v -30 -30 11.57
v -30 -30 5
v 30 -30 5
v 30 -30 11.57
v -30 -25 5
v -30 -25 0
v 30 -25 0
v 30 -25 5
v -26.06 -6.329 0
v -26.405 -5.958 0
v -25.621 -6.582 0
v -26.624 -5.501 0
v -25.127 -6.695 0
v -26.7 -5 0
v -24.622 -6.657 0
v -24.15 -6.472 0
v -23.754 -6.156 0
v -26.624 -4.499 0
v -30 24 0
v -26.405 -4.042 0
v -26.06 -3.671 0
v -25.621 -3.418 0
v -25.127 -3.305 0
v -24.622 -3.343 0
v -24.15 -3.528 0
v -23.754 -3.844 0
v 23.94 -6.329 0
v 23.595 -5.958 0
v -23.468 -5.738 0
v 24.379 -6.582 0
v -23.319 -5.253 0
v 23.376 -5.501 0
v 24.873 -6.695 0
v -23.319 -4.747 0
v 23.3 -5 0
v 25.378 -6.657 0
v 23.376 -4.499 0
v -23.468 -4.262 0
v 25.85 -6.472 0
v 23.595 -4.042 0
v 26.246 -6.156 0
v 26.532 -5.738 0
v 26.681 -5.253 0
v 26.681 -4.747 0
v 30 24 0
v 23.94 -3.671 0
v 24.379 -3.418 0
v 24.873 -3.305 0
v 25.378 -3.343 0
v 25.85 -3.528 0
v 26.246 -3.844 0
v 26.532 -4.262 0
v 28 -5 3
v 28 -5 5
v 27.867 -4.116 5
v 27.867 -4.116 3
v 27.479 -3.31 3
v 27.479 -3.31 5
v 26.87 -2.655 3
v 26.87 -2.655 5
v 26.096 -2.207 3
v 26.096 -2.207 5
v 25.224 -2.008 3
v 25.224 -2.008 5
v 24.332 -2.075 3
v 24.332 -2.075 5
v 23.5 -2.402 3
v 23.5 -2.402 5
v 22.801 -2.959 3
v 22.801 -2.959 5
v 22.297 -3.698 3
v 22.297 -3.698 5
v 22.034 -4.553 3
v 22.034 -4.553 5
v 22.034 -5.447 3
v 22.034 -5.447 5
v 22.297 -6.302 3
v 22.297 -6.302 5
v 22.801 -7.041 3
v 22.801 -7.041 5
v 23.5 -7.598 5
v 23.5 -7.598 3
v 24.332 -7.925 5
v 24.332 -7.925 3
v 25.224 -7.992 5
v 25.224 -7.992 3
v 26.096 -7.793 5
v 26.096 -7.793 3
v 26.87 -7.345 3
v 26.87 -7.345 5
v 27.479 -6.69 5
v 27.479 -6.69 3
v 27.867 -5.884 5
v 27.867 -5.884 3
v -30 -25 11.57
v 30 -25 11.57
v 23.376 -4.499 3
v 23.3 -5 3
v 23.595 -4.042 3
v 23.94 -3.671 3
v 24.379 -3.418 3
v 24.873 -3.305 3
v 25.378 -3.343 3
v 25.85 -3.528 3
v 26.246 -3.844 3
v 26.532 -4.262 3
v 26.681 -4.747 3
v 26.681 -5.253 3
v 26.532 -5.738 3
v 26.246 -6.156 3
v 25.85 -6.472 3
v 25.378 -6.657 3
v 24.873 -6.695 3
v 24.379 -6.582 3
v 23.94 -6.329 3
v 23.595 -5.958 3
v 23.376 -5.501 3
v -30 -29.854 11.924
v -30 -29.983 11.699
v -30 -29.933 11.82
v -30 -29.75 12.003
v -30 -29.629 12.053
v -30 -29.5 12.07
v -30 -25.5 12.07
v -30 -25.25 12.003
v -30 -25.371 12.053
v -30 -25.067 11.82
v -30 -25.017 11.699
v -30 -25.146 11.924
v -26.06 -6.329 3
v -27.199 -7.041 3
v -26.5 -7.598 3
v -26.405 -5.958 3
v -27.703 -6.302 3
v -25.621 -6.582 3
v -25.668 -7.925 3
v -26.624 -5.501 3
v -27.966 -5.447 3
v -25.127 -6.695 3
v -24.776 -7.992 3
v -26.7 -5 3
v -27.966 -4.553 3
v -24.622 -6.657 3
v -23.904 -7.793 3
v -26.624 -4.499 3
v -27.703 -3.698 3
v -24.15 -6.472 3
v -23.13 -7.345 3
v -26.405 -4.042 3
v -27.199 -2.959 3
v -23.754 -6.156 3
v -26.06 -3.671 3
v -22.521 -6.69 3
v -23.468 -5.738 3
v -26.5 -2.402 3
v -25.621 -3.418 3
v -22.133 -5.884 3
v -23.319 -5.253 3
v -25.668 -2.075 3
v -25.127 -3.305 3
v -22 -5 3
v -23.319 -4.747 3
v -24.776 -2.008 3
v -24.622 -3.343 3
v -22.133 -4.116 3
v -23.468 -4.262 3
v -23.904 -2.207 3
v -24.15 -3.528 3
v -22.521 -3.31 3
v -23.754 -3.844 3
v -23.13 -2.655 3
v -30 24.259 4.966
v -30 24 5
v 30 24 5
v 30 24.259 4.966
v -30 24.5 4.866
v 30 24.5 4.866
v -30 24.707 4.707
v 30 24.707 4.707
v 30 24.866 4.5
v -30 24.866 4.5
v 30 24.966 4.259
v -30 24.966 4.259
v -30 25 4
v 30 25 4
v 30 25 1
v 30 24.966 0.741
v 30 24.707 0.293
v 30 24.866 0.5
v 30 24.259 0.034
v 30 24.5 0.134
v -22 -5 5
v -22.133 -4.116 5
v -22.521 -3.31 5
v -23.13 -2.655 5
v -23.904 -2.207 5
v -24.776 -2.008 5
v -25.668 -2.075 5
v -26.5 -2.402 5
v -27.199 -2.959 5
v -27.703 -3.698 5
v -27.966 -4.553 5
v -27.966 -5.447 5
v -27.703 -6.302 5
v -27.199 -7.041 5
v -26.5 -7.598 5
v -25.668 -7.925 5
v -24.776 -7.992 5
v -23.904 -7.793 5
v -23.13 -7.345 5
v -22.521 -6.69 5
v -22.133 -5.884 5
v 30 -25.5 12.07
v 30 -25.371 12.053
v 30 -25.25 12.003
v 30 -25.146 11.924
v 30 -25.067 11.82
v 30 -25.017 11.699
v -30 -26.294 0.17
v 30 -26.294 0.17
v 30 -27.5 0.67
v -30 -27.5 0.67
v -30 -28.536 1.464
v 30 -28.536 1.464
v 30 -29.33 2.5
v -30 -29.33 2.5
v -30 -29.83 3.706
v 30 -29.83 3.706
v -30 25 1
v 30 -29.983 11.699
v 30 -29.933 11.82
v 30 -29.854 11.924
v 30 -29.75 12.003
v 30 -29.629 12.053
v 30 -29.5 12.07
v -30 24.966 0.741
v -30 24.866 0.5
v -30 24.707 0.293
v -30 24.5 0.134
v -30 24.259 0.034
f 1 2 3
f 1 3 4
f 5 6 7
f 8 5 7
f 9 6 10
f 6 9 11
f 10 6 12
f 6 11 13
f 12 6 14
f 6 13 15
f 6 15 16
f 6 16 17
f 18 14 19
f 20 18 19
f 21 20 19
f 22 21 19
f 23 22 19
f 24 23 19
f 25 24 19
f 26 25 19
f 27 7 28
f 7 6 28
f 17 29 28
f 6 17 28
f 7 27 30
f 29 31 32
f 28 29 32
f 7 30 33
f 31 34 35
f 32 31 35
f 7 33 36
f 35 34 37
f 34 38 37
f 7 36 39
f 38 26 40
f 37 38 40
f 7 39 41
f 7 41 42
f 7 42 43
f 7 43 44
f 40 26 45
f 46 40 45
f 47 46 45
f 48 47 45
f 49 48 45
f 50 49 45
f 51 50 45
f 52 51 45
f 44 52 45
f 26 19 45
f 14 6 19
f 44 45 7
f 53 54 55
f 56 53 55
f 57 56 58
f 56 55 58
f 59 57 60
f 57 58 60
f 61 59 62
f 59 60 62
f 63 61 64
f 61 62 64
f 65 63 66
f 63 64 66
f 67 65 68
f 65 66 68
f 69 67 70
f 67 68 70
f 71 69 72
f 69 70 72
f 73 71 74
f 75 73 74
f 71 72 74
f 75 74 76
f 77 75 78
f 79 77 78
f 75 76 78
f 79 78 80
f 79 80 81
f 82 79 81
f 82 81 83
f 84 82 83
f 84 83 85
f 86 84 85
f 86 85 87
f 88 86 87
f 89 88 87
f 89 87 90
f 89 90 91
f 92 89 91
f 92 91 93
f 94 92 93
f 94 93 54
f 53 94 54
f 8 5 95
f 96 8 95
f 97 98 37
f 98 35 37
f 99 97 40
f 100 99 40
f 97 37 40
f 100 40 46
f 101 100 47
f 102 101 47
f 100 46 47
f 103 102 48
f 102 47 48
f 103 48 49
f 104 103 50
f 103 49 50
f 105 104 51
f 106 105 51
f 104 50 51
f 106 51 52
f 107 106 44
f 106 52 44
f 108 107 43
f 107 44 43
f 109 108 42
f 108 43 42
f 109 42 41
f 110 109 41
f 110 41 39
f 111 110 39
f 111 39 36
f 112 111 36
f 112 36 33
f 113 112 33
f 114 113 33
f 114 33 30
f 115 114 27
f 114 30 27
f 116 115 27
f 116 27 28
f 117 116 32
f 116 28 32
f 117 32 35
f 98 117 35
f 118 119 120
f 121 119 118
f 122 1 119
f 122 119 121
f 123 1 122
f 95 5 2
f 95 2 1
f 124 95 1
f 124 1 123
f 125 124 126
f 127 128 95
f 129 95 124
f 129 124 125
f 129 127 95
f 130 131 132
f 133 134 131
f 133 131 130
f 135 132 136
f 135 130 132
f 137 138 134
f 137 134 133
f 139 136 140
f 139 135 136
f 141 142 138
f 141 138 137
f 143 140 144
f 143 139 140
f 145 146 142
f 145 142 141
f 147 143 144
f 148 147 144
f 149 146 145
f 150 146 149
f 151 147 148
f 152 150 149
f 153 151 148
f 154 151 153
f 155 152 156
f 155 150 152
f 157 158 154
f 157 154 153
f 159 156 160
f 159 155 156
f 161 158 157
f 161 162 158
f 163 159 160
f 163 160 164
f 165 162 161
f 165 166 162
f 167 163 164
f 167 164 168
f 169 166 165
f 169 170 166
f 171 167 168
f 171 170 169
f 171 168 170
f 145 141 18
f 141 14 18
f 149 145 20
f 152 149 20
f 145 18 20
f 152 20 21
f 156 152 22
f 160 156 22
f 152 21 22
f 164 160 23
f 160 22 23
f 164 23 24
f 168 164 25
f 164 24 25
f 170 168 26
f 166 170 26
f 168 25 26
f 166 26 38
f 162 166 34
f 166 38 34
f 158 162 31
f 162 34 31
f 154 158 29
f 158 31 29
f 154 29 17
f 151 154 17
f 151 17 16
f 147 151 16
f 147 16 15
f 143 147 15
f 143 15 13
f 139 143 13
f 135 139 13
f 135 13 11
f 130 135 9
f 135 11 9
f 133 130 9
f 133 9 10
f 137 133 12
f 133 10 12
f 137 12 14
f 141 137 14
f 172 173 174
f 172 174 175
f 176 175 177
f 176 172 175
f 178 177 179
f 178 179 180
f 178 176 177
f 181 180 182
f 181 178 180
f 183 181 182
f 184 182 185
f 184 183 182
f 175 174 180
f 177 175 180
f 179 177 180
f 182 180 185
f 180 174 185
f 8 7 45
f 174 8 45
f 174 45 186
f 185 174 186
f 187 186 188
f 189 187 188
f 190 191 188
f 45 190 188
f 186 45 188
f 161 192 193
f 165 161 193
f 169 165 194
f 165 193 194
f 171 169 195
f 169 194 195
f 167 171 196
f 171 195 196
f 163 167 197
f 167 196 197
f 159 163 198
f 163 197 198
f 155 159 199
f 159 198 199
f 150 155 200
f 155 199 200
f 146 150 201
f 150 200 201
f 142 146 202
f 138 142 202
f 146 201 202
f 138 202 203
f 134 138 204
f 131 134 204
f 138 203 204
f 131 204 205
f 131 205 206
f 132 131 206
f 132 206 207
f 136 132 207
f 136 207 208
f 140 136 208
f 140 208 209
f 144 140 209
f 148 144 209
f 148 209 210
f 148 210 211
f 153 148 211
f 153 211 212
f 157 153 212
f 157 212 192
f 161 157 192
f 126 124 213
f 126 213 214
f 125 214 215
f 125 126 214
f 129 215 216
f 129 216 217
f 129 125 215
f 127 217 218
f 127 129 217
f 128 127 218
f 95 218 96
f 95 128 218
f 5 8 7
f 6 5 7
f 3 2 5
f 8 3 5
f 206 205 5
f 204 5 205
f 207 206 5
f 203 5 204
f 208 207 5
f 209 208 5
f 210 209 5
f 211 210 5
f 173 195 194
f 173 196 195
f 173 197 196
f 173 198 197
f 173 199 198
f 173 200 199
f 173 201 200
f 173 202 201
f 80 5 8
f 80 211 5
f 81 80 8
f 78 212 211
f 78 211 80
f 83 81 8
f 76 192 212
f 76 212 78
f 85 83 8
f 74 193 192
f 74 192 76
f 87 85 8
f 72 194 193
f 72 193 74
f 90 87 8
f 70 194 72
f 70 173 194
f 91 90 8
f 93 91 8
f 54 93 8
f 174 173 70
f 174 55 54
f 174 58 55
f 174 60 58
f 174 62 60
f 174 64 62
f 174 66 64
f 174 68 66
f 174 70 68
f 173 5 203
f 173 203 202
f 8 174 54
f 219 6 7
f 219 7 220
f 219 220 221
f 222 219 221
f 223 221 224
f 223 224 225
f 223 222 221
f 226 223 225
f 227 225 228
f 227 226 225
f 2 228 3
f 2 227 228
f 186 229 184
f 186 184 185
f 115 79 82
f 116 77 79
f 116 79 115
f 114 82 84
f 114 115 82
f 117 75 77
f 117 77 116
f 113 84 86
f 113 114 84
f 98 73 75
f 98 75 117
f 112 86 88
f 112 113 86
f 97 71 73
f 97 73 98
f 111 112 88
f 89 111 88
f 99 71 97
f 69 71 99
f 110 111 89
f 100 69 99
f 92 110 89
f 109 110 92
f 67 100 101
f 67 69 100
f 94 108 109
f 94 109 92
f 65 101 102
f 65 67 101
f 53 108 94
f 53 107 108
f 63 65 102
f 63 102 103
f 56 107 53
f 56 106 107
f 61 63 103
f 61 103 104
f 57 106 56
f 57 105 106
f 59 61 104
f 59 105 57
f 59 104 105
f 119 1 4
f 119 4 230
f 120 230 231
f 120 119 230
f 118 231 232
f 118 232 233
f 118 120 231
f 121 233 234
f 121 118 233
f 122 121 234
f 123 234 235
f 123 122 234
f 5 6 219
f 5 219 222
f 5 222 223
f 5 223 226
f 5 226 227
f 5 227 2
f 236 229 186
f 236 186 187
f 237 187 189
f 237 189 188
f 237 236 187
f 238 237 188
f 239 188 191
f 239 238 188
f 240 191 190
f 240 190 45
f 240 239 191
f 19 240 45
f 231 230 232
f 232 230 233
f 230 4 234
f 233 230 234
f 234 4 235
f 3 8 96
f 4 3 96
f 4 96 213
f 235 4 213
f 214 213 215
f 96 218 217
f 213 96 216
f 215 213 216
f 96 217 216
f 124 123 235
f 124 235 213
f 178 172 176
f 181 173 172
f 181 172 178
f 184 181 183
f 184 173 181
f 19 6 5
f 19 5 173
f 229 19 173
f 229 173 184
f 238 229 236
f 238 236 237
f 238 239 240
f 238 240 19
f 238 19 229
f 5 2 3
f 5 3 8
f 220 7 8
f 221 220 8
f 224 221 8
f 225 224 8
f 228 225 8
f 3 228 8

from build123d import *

# Parameters (mm, degrees)
SKETCH_1_W                = 60
SKETCH_1_H                = 50
EXTRUDE_1_DEPTH           = 5
HOLE_WIZARD_1_D           = 3.4
HOLE_WIZARD_1_DEPTH       = 7
HOLE_WIZARD_1_CBORE_D     = 6
HOLE_WIZARD_1_CBORE_DEPTH = 2
SKETCH_4_W                = 7.07
SKETCH_4_H                = 5
EXTRUDE_2_DEPTH           = 60
EXTRUDE_3_DEPTH           = 60
CUT_EXTRUDE_2_DEPTH       = 69.159261293
CUT_EXTRUDE_3_DEPTH       = 60


with BuildPart() as part:
    # 草图1 → 凸台-拉伸1 (new body)
    with BuildSketch(Plane.XY):
        Rectangle(SKETCH_1_W, SKETCH_1_H)
    extrude(amount=EXTRUDE_1_DEPTH)

    # 打孔尺寸(%根据)内六角圆柱头螺钉的类型1
    with Locations(Plane.XY.offset(5)):
        with Locations((-25, -5), (25, -5)):
            CounterBoreHole(HOLE_WIZARD_1_D / 2, HOLE_WIZARD_1_CBORE_D / 2, HOLE_WIZARD_1_CBORE_DEPTH, depth=HOLE_WIZARD_1_DEPTH)

    # 草图7 → 切除-拉伸2 (cut, through all)
    with BuildSketch(Plane.ZY.offset(30)):
        with BuildLine():
            Line((4, 25), (5, 25))
            Line((5, 25), (5, 24))
            ThreePointArc((5, 24), (4.707106781, 24.707106781), (4, 25))
        make_face()
        with BuildLine():
            Line((0, 24), (0, 25))
            Line((0, 25), (1, 25))
            ThreePointArc((1, 25), (0.292893219, 24.707106781), (0, 24))
        make_face()
    extrude(amount=-CUT_EXTRUDE_2_DEPTH, mode=Mode.SUBTRACT)


with BuildPart() as body_2:
    # 草图4 → 凸台-拉伸2 (new body)
    with BuildSketch(Plane.ZY.offset(30)):
        with Locations((8.535, -27.5)):
            Rectangle(SKETCH_4_W, SKETCH_4_H)
    extrude(amount=-EXTRUDE_2_DEPTH)

    # 草图8 → 切除-拉伸3 (cut)
    with BuildSketch(Plane.ZY.offset(30)):
        with BuildLine():
            Line((11.57, -25), (12.07, -25))
            Line((12.07, -25), (12.07, -25.5))
            ThreePointArc((12.07, -25.5), (11.923553391, -25.146446609), (11.57, -25))
        make_face()
        with BuildLine():
            Line((12.07, -29.5), (12.07, -30))
            Line((12.07, -30), (11.57, -30))
            ThreePointArc((11.57, -30), (11.923553391, -29.853553391), (12.07, -29.5))
        make_face()
    extrude(amount=-CUT_EXTRUDE_3_DEPTH, mode=Mode.SUBTRACT)


with BuildPart() as body_3:
    # 草图5 → 凸台-拉伸3 (new body)
    with BuildSketch(Plane.ZY.offset(30)):
        with BuildLine():
            Line((5, -30), (5, -25))
            Line((5, -25), (0, -25))
            ThreePointArc((0, -25), (1.464466094, -28.535533906), (5, -30))
        make_face()
    extrude(amount=-EXTRUDE_3_DEPTH)


solid = Compound([part.part, body_2.part, body_3.part])
